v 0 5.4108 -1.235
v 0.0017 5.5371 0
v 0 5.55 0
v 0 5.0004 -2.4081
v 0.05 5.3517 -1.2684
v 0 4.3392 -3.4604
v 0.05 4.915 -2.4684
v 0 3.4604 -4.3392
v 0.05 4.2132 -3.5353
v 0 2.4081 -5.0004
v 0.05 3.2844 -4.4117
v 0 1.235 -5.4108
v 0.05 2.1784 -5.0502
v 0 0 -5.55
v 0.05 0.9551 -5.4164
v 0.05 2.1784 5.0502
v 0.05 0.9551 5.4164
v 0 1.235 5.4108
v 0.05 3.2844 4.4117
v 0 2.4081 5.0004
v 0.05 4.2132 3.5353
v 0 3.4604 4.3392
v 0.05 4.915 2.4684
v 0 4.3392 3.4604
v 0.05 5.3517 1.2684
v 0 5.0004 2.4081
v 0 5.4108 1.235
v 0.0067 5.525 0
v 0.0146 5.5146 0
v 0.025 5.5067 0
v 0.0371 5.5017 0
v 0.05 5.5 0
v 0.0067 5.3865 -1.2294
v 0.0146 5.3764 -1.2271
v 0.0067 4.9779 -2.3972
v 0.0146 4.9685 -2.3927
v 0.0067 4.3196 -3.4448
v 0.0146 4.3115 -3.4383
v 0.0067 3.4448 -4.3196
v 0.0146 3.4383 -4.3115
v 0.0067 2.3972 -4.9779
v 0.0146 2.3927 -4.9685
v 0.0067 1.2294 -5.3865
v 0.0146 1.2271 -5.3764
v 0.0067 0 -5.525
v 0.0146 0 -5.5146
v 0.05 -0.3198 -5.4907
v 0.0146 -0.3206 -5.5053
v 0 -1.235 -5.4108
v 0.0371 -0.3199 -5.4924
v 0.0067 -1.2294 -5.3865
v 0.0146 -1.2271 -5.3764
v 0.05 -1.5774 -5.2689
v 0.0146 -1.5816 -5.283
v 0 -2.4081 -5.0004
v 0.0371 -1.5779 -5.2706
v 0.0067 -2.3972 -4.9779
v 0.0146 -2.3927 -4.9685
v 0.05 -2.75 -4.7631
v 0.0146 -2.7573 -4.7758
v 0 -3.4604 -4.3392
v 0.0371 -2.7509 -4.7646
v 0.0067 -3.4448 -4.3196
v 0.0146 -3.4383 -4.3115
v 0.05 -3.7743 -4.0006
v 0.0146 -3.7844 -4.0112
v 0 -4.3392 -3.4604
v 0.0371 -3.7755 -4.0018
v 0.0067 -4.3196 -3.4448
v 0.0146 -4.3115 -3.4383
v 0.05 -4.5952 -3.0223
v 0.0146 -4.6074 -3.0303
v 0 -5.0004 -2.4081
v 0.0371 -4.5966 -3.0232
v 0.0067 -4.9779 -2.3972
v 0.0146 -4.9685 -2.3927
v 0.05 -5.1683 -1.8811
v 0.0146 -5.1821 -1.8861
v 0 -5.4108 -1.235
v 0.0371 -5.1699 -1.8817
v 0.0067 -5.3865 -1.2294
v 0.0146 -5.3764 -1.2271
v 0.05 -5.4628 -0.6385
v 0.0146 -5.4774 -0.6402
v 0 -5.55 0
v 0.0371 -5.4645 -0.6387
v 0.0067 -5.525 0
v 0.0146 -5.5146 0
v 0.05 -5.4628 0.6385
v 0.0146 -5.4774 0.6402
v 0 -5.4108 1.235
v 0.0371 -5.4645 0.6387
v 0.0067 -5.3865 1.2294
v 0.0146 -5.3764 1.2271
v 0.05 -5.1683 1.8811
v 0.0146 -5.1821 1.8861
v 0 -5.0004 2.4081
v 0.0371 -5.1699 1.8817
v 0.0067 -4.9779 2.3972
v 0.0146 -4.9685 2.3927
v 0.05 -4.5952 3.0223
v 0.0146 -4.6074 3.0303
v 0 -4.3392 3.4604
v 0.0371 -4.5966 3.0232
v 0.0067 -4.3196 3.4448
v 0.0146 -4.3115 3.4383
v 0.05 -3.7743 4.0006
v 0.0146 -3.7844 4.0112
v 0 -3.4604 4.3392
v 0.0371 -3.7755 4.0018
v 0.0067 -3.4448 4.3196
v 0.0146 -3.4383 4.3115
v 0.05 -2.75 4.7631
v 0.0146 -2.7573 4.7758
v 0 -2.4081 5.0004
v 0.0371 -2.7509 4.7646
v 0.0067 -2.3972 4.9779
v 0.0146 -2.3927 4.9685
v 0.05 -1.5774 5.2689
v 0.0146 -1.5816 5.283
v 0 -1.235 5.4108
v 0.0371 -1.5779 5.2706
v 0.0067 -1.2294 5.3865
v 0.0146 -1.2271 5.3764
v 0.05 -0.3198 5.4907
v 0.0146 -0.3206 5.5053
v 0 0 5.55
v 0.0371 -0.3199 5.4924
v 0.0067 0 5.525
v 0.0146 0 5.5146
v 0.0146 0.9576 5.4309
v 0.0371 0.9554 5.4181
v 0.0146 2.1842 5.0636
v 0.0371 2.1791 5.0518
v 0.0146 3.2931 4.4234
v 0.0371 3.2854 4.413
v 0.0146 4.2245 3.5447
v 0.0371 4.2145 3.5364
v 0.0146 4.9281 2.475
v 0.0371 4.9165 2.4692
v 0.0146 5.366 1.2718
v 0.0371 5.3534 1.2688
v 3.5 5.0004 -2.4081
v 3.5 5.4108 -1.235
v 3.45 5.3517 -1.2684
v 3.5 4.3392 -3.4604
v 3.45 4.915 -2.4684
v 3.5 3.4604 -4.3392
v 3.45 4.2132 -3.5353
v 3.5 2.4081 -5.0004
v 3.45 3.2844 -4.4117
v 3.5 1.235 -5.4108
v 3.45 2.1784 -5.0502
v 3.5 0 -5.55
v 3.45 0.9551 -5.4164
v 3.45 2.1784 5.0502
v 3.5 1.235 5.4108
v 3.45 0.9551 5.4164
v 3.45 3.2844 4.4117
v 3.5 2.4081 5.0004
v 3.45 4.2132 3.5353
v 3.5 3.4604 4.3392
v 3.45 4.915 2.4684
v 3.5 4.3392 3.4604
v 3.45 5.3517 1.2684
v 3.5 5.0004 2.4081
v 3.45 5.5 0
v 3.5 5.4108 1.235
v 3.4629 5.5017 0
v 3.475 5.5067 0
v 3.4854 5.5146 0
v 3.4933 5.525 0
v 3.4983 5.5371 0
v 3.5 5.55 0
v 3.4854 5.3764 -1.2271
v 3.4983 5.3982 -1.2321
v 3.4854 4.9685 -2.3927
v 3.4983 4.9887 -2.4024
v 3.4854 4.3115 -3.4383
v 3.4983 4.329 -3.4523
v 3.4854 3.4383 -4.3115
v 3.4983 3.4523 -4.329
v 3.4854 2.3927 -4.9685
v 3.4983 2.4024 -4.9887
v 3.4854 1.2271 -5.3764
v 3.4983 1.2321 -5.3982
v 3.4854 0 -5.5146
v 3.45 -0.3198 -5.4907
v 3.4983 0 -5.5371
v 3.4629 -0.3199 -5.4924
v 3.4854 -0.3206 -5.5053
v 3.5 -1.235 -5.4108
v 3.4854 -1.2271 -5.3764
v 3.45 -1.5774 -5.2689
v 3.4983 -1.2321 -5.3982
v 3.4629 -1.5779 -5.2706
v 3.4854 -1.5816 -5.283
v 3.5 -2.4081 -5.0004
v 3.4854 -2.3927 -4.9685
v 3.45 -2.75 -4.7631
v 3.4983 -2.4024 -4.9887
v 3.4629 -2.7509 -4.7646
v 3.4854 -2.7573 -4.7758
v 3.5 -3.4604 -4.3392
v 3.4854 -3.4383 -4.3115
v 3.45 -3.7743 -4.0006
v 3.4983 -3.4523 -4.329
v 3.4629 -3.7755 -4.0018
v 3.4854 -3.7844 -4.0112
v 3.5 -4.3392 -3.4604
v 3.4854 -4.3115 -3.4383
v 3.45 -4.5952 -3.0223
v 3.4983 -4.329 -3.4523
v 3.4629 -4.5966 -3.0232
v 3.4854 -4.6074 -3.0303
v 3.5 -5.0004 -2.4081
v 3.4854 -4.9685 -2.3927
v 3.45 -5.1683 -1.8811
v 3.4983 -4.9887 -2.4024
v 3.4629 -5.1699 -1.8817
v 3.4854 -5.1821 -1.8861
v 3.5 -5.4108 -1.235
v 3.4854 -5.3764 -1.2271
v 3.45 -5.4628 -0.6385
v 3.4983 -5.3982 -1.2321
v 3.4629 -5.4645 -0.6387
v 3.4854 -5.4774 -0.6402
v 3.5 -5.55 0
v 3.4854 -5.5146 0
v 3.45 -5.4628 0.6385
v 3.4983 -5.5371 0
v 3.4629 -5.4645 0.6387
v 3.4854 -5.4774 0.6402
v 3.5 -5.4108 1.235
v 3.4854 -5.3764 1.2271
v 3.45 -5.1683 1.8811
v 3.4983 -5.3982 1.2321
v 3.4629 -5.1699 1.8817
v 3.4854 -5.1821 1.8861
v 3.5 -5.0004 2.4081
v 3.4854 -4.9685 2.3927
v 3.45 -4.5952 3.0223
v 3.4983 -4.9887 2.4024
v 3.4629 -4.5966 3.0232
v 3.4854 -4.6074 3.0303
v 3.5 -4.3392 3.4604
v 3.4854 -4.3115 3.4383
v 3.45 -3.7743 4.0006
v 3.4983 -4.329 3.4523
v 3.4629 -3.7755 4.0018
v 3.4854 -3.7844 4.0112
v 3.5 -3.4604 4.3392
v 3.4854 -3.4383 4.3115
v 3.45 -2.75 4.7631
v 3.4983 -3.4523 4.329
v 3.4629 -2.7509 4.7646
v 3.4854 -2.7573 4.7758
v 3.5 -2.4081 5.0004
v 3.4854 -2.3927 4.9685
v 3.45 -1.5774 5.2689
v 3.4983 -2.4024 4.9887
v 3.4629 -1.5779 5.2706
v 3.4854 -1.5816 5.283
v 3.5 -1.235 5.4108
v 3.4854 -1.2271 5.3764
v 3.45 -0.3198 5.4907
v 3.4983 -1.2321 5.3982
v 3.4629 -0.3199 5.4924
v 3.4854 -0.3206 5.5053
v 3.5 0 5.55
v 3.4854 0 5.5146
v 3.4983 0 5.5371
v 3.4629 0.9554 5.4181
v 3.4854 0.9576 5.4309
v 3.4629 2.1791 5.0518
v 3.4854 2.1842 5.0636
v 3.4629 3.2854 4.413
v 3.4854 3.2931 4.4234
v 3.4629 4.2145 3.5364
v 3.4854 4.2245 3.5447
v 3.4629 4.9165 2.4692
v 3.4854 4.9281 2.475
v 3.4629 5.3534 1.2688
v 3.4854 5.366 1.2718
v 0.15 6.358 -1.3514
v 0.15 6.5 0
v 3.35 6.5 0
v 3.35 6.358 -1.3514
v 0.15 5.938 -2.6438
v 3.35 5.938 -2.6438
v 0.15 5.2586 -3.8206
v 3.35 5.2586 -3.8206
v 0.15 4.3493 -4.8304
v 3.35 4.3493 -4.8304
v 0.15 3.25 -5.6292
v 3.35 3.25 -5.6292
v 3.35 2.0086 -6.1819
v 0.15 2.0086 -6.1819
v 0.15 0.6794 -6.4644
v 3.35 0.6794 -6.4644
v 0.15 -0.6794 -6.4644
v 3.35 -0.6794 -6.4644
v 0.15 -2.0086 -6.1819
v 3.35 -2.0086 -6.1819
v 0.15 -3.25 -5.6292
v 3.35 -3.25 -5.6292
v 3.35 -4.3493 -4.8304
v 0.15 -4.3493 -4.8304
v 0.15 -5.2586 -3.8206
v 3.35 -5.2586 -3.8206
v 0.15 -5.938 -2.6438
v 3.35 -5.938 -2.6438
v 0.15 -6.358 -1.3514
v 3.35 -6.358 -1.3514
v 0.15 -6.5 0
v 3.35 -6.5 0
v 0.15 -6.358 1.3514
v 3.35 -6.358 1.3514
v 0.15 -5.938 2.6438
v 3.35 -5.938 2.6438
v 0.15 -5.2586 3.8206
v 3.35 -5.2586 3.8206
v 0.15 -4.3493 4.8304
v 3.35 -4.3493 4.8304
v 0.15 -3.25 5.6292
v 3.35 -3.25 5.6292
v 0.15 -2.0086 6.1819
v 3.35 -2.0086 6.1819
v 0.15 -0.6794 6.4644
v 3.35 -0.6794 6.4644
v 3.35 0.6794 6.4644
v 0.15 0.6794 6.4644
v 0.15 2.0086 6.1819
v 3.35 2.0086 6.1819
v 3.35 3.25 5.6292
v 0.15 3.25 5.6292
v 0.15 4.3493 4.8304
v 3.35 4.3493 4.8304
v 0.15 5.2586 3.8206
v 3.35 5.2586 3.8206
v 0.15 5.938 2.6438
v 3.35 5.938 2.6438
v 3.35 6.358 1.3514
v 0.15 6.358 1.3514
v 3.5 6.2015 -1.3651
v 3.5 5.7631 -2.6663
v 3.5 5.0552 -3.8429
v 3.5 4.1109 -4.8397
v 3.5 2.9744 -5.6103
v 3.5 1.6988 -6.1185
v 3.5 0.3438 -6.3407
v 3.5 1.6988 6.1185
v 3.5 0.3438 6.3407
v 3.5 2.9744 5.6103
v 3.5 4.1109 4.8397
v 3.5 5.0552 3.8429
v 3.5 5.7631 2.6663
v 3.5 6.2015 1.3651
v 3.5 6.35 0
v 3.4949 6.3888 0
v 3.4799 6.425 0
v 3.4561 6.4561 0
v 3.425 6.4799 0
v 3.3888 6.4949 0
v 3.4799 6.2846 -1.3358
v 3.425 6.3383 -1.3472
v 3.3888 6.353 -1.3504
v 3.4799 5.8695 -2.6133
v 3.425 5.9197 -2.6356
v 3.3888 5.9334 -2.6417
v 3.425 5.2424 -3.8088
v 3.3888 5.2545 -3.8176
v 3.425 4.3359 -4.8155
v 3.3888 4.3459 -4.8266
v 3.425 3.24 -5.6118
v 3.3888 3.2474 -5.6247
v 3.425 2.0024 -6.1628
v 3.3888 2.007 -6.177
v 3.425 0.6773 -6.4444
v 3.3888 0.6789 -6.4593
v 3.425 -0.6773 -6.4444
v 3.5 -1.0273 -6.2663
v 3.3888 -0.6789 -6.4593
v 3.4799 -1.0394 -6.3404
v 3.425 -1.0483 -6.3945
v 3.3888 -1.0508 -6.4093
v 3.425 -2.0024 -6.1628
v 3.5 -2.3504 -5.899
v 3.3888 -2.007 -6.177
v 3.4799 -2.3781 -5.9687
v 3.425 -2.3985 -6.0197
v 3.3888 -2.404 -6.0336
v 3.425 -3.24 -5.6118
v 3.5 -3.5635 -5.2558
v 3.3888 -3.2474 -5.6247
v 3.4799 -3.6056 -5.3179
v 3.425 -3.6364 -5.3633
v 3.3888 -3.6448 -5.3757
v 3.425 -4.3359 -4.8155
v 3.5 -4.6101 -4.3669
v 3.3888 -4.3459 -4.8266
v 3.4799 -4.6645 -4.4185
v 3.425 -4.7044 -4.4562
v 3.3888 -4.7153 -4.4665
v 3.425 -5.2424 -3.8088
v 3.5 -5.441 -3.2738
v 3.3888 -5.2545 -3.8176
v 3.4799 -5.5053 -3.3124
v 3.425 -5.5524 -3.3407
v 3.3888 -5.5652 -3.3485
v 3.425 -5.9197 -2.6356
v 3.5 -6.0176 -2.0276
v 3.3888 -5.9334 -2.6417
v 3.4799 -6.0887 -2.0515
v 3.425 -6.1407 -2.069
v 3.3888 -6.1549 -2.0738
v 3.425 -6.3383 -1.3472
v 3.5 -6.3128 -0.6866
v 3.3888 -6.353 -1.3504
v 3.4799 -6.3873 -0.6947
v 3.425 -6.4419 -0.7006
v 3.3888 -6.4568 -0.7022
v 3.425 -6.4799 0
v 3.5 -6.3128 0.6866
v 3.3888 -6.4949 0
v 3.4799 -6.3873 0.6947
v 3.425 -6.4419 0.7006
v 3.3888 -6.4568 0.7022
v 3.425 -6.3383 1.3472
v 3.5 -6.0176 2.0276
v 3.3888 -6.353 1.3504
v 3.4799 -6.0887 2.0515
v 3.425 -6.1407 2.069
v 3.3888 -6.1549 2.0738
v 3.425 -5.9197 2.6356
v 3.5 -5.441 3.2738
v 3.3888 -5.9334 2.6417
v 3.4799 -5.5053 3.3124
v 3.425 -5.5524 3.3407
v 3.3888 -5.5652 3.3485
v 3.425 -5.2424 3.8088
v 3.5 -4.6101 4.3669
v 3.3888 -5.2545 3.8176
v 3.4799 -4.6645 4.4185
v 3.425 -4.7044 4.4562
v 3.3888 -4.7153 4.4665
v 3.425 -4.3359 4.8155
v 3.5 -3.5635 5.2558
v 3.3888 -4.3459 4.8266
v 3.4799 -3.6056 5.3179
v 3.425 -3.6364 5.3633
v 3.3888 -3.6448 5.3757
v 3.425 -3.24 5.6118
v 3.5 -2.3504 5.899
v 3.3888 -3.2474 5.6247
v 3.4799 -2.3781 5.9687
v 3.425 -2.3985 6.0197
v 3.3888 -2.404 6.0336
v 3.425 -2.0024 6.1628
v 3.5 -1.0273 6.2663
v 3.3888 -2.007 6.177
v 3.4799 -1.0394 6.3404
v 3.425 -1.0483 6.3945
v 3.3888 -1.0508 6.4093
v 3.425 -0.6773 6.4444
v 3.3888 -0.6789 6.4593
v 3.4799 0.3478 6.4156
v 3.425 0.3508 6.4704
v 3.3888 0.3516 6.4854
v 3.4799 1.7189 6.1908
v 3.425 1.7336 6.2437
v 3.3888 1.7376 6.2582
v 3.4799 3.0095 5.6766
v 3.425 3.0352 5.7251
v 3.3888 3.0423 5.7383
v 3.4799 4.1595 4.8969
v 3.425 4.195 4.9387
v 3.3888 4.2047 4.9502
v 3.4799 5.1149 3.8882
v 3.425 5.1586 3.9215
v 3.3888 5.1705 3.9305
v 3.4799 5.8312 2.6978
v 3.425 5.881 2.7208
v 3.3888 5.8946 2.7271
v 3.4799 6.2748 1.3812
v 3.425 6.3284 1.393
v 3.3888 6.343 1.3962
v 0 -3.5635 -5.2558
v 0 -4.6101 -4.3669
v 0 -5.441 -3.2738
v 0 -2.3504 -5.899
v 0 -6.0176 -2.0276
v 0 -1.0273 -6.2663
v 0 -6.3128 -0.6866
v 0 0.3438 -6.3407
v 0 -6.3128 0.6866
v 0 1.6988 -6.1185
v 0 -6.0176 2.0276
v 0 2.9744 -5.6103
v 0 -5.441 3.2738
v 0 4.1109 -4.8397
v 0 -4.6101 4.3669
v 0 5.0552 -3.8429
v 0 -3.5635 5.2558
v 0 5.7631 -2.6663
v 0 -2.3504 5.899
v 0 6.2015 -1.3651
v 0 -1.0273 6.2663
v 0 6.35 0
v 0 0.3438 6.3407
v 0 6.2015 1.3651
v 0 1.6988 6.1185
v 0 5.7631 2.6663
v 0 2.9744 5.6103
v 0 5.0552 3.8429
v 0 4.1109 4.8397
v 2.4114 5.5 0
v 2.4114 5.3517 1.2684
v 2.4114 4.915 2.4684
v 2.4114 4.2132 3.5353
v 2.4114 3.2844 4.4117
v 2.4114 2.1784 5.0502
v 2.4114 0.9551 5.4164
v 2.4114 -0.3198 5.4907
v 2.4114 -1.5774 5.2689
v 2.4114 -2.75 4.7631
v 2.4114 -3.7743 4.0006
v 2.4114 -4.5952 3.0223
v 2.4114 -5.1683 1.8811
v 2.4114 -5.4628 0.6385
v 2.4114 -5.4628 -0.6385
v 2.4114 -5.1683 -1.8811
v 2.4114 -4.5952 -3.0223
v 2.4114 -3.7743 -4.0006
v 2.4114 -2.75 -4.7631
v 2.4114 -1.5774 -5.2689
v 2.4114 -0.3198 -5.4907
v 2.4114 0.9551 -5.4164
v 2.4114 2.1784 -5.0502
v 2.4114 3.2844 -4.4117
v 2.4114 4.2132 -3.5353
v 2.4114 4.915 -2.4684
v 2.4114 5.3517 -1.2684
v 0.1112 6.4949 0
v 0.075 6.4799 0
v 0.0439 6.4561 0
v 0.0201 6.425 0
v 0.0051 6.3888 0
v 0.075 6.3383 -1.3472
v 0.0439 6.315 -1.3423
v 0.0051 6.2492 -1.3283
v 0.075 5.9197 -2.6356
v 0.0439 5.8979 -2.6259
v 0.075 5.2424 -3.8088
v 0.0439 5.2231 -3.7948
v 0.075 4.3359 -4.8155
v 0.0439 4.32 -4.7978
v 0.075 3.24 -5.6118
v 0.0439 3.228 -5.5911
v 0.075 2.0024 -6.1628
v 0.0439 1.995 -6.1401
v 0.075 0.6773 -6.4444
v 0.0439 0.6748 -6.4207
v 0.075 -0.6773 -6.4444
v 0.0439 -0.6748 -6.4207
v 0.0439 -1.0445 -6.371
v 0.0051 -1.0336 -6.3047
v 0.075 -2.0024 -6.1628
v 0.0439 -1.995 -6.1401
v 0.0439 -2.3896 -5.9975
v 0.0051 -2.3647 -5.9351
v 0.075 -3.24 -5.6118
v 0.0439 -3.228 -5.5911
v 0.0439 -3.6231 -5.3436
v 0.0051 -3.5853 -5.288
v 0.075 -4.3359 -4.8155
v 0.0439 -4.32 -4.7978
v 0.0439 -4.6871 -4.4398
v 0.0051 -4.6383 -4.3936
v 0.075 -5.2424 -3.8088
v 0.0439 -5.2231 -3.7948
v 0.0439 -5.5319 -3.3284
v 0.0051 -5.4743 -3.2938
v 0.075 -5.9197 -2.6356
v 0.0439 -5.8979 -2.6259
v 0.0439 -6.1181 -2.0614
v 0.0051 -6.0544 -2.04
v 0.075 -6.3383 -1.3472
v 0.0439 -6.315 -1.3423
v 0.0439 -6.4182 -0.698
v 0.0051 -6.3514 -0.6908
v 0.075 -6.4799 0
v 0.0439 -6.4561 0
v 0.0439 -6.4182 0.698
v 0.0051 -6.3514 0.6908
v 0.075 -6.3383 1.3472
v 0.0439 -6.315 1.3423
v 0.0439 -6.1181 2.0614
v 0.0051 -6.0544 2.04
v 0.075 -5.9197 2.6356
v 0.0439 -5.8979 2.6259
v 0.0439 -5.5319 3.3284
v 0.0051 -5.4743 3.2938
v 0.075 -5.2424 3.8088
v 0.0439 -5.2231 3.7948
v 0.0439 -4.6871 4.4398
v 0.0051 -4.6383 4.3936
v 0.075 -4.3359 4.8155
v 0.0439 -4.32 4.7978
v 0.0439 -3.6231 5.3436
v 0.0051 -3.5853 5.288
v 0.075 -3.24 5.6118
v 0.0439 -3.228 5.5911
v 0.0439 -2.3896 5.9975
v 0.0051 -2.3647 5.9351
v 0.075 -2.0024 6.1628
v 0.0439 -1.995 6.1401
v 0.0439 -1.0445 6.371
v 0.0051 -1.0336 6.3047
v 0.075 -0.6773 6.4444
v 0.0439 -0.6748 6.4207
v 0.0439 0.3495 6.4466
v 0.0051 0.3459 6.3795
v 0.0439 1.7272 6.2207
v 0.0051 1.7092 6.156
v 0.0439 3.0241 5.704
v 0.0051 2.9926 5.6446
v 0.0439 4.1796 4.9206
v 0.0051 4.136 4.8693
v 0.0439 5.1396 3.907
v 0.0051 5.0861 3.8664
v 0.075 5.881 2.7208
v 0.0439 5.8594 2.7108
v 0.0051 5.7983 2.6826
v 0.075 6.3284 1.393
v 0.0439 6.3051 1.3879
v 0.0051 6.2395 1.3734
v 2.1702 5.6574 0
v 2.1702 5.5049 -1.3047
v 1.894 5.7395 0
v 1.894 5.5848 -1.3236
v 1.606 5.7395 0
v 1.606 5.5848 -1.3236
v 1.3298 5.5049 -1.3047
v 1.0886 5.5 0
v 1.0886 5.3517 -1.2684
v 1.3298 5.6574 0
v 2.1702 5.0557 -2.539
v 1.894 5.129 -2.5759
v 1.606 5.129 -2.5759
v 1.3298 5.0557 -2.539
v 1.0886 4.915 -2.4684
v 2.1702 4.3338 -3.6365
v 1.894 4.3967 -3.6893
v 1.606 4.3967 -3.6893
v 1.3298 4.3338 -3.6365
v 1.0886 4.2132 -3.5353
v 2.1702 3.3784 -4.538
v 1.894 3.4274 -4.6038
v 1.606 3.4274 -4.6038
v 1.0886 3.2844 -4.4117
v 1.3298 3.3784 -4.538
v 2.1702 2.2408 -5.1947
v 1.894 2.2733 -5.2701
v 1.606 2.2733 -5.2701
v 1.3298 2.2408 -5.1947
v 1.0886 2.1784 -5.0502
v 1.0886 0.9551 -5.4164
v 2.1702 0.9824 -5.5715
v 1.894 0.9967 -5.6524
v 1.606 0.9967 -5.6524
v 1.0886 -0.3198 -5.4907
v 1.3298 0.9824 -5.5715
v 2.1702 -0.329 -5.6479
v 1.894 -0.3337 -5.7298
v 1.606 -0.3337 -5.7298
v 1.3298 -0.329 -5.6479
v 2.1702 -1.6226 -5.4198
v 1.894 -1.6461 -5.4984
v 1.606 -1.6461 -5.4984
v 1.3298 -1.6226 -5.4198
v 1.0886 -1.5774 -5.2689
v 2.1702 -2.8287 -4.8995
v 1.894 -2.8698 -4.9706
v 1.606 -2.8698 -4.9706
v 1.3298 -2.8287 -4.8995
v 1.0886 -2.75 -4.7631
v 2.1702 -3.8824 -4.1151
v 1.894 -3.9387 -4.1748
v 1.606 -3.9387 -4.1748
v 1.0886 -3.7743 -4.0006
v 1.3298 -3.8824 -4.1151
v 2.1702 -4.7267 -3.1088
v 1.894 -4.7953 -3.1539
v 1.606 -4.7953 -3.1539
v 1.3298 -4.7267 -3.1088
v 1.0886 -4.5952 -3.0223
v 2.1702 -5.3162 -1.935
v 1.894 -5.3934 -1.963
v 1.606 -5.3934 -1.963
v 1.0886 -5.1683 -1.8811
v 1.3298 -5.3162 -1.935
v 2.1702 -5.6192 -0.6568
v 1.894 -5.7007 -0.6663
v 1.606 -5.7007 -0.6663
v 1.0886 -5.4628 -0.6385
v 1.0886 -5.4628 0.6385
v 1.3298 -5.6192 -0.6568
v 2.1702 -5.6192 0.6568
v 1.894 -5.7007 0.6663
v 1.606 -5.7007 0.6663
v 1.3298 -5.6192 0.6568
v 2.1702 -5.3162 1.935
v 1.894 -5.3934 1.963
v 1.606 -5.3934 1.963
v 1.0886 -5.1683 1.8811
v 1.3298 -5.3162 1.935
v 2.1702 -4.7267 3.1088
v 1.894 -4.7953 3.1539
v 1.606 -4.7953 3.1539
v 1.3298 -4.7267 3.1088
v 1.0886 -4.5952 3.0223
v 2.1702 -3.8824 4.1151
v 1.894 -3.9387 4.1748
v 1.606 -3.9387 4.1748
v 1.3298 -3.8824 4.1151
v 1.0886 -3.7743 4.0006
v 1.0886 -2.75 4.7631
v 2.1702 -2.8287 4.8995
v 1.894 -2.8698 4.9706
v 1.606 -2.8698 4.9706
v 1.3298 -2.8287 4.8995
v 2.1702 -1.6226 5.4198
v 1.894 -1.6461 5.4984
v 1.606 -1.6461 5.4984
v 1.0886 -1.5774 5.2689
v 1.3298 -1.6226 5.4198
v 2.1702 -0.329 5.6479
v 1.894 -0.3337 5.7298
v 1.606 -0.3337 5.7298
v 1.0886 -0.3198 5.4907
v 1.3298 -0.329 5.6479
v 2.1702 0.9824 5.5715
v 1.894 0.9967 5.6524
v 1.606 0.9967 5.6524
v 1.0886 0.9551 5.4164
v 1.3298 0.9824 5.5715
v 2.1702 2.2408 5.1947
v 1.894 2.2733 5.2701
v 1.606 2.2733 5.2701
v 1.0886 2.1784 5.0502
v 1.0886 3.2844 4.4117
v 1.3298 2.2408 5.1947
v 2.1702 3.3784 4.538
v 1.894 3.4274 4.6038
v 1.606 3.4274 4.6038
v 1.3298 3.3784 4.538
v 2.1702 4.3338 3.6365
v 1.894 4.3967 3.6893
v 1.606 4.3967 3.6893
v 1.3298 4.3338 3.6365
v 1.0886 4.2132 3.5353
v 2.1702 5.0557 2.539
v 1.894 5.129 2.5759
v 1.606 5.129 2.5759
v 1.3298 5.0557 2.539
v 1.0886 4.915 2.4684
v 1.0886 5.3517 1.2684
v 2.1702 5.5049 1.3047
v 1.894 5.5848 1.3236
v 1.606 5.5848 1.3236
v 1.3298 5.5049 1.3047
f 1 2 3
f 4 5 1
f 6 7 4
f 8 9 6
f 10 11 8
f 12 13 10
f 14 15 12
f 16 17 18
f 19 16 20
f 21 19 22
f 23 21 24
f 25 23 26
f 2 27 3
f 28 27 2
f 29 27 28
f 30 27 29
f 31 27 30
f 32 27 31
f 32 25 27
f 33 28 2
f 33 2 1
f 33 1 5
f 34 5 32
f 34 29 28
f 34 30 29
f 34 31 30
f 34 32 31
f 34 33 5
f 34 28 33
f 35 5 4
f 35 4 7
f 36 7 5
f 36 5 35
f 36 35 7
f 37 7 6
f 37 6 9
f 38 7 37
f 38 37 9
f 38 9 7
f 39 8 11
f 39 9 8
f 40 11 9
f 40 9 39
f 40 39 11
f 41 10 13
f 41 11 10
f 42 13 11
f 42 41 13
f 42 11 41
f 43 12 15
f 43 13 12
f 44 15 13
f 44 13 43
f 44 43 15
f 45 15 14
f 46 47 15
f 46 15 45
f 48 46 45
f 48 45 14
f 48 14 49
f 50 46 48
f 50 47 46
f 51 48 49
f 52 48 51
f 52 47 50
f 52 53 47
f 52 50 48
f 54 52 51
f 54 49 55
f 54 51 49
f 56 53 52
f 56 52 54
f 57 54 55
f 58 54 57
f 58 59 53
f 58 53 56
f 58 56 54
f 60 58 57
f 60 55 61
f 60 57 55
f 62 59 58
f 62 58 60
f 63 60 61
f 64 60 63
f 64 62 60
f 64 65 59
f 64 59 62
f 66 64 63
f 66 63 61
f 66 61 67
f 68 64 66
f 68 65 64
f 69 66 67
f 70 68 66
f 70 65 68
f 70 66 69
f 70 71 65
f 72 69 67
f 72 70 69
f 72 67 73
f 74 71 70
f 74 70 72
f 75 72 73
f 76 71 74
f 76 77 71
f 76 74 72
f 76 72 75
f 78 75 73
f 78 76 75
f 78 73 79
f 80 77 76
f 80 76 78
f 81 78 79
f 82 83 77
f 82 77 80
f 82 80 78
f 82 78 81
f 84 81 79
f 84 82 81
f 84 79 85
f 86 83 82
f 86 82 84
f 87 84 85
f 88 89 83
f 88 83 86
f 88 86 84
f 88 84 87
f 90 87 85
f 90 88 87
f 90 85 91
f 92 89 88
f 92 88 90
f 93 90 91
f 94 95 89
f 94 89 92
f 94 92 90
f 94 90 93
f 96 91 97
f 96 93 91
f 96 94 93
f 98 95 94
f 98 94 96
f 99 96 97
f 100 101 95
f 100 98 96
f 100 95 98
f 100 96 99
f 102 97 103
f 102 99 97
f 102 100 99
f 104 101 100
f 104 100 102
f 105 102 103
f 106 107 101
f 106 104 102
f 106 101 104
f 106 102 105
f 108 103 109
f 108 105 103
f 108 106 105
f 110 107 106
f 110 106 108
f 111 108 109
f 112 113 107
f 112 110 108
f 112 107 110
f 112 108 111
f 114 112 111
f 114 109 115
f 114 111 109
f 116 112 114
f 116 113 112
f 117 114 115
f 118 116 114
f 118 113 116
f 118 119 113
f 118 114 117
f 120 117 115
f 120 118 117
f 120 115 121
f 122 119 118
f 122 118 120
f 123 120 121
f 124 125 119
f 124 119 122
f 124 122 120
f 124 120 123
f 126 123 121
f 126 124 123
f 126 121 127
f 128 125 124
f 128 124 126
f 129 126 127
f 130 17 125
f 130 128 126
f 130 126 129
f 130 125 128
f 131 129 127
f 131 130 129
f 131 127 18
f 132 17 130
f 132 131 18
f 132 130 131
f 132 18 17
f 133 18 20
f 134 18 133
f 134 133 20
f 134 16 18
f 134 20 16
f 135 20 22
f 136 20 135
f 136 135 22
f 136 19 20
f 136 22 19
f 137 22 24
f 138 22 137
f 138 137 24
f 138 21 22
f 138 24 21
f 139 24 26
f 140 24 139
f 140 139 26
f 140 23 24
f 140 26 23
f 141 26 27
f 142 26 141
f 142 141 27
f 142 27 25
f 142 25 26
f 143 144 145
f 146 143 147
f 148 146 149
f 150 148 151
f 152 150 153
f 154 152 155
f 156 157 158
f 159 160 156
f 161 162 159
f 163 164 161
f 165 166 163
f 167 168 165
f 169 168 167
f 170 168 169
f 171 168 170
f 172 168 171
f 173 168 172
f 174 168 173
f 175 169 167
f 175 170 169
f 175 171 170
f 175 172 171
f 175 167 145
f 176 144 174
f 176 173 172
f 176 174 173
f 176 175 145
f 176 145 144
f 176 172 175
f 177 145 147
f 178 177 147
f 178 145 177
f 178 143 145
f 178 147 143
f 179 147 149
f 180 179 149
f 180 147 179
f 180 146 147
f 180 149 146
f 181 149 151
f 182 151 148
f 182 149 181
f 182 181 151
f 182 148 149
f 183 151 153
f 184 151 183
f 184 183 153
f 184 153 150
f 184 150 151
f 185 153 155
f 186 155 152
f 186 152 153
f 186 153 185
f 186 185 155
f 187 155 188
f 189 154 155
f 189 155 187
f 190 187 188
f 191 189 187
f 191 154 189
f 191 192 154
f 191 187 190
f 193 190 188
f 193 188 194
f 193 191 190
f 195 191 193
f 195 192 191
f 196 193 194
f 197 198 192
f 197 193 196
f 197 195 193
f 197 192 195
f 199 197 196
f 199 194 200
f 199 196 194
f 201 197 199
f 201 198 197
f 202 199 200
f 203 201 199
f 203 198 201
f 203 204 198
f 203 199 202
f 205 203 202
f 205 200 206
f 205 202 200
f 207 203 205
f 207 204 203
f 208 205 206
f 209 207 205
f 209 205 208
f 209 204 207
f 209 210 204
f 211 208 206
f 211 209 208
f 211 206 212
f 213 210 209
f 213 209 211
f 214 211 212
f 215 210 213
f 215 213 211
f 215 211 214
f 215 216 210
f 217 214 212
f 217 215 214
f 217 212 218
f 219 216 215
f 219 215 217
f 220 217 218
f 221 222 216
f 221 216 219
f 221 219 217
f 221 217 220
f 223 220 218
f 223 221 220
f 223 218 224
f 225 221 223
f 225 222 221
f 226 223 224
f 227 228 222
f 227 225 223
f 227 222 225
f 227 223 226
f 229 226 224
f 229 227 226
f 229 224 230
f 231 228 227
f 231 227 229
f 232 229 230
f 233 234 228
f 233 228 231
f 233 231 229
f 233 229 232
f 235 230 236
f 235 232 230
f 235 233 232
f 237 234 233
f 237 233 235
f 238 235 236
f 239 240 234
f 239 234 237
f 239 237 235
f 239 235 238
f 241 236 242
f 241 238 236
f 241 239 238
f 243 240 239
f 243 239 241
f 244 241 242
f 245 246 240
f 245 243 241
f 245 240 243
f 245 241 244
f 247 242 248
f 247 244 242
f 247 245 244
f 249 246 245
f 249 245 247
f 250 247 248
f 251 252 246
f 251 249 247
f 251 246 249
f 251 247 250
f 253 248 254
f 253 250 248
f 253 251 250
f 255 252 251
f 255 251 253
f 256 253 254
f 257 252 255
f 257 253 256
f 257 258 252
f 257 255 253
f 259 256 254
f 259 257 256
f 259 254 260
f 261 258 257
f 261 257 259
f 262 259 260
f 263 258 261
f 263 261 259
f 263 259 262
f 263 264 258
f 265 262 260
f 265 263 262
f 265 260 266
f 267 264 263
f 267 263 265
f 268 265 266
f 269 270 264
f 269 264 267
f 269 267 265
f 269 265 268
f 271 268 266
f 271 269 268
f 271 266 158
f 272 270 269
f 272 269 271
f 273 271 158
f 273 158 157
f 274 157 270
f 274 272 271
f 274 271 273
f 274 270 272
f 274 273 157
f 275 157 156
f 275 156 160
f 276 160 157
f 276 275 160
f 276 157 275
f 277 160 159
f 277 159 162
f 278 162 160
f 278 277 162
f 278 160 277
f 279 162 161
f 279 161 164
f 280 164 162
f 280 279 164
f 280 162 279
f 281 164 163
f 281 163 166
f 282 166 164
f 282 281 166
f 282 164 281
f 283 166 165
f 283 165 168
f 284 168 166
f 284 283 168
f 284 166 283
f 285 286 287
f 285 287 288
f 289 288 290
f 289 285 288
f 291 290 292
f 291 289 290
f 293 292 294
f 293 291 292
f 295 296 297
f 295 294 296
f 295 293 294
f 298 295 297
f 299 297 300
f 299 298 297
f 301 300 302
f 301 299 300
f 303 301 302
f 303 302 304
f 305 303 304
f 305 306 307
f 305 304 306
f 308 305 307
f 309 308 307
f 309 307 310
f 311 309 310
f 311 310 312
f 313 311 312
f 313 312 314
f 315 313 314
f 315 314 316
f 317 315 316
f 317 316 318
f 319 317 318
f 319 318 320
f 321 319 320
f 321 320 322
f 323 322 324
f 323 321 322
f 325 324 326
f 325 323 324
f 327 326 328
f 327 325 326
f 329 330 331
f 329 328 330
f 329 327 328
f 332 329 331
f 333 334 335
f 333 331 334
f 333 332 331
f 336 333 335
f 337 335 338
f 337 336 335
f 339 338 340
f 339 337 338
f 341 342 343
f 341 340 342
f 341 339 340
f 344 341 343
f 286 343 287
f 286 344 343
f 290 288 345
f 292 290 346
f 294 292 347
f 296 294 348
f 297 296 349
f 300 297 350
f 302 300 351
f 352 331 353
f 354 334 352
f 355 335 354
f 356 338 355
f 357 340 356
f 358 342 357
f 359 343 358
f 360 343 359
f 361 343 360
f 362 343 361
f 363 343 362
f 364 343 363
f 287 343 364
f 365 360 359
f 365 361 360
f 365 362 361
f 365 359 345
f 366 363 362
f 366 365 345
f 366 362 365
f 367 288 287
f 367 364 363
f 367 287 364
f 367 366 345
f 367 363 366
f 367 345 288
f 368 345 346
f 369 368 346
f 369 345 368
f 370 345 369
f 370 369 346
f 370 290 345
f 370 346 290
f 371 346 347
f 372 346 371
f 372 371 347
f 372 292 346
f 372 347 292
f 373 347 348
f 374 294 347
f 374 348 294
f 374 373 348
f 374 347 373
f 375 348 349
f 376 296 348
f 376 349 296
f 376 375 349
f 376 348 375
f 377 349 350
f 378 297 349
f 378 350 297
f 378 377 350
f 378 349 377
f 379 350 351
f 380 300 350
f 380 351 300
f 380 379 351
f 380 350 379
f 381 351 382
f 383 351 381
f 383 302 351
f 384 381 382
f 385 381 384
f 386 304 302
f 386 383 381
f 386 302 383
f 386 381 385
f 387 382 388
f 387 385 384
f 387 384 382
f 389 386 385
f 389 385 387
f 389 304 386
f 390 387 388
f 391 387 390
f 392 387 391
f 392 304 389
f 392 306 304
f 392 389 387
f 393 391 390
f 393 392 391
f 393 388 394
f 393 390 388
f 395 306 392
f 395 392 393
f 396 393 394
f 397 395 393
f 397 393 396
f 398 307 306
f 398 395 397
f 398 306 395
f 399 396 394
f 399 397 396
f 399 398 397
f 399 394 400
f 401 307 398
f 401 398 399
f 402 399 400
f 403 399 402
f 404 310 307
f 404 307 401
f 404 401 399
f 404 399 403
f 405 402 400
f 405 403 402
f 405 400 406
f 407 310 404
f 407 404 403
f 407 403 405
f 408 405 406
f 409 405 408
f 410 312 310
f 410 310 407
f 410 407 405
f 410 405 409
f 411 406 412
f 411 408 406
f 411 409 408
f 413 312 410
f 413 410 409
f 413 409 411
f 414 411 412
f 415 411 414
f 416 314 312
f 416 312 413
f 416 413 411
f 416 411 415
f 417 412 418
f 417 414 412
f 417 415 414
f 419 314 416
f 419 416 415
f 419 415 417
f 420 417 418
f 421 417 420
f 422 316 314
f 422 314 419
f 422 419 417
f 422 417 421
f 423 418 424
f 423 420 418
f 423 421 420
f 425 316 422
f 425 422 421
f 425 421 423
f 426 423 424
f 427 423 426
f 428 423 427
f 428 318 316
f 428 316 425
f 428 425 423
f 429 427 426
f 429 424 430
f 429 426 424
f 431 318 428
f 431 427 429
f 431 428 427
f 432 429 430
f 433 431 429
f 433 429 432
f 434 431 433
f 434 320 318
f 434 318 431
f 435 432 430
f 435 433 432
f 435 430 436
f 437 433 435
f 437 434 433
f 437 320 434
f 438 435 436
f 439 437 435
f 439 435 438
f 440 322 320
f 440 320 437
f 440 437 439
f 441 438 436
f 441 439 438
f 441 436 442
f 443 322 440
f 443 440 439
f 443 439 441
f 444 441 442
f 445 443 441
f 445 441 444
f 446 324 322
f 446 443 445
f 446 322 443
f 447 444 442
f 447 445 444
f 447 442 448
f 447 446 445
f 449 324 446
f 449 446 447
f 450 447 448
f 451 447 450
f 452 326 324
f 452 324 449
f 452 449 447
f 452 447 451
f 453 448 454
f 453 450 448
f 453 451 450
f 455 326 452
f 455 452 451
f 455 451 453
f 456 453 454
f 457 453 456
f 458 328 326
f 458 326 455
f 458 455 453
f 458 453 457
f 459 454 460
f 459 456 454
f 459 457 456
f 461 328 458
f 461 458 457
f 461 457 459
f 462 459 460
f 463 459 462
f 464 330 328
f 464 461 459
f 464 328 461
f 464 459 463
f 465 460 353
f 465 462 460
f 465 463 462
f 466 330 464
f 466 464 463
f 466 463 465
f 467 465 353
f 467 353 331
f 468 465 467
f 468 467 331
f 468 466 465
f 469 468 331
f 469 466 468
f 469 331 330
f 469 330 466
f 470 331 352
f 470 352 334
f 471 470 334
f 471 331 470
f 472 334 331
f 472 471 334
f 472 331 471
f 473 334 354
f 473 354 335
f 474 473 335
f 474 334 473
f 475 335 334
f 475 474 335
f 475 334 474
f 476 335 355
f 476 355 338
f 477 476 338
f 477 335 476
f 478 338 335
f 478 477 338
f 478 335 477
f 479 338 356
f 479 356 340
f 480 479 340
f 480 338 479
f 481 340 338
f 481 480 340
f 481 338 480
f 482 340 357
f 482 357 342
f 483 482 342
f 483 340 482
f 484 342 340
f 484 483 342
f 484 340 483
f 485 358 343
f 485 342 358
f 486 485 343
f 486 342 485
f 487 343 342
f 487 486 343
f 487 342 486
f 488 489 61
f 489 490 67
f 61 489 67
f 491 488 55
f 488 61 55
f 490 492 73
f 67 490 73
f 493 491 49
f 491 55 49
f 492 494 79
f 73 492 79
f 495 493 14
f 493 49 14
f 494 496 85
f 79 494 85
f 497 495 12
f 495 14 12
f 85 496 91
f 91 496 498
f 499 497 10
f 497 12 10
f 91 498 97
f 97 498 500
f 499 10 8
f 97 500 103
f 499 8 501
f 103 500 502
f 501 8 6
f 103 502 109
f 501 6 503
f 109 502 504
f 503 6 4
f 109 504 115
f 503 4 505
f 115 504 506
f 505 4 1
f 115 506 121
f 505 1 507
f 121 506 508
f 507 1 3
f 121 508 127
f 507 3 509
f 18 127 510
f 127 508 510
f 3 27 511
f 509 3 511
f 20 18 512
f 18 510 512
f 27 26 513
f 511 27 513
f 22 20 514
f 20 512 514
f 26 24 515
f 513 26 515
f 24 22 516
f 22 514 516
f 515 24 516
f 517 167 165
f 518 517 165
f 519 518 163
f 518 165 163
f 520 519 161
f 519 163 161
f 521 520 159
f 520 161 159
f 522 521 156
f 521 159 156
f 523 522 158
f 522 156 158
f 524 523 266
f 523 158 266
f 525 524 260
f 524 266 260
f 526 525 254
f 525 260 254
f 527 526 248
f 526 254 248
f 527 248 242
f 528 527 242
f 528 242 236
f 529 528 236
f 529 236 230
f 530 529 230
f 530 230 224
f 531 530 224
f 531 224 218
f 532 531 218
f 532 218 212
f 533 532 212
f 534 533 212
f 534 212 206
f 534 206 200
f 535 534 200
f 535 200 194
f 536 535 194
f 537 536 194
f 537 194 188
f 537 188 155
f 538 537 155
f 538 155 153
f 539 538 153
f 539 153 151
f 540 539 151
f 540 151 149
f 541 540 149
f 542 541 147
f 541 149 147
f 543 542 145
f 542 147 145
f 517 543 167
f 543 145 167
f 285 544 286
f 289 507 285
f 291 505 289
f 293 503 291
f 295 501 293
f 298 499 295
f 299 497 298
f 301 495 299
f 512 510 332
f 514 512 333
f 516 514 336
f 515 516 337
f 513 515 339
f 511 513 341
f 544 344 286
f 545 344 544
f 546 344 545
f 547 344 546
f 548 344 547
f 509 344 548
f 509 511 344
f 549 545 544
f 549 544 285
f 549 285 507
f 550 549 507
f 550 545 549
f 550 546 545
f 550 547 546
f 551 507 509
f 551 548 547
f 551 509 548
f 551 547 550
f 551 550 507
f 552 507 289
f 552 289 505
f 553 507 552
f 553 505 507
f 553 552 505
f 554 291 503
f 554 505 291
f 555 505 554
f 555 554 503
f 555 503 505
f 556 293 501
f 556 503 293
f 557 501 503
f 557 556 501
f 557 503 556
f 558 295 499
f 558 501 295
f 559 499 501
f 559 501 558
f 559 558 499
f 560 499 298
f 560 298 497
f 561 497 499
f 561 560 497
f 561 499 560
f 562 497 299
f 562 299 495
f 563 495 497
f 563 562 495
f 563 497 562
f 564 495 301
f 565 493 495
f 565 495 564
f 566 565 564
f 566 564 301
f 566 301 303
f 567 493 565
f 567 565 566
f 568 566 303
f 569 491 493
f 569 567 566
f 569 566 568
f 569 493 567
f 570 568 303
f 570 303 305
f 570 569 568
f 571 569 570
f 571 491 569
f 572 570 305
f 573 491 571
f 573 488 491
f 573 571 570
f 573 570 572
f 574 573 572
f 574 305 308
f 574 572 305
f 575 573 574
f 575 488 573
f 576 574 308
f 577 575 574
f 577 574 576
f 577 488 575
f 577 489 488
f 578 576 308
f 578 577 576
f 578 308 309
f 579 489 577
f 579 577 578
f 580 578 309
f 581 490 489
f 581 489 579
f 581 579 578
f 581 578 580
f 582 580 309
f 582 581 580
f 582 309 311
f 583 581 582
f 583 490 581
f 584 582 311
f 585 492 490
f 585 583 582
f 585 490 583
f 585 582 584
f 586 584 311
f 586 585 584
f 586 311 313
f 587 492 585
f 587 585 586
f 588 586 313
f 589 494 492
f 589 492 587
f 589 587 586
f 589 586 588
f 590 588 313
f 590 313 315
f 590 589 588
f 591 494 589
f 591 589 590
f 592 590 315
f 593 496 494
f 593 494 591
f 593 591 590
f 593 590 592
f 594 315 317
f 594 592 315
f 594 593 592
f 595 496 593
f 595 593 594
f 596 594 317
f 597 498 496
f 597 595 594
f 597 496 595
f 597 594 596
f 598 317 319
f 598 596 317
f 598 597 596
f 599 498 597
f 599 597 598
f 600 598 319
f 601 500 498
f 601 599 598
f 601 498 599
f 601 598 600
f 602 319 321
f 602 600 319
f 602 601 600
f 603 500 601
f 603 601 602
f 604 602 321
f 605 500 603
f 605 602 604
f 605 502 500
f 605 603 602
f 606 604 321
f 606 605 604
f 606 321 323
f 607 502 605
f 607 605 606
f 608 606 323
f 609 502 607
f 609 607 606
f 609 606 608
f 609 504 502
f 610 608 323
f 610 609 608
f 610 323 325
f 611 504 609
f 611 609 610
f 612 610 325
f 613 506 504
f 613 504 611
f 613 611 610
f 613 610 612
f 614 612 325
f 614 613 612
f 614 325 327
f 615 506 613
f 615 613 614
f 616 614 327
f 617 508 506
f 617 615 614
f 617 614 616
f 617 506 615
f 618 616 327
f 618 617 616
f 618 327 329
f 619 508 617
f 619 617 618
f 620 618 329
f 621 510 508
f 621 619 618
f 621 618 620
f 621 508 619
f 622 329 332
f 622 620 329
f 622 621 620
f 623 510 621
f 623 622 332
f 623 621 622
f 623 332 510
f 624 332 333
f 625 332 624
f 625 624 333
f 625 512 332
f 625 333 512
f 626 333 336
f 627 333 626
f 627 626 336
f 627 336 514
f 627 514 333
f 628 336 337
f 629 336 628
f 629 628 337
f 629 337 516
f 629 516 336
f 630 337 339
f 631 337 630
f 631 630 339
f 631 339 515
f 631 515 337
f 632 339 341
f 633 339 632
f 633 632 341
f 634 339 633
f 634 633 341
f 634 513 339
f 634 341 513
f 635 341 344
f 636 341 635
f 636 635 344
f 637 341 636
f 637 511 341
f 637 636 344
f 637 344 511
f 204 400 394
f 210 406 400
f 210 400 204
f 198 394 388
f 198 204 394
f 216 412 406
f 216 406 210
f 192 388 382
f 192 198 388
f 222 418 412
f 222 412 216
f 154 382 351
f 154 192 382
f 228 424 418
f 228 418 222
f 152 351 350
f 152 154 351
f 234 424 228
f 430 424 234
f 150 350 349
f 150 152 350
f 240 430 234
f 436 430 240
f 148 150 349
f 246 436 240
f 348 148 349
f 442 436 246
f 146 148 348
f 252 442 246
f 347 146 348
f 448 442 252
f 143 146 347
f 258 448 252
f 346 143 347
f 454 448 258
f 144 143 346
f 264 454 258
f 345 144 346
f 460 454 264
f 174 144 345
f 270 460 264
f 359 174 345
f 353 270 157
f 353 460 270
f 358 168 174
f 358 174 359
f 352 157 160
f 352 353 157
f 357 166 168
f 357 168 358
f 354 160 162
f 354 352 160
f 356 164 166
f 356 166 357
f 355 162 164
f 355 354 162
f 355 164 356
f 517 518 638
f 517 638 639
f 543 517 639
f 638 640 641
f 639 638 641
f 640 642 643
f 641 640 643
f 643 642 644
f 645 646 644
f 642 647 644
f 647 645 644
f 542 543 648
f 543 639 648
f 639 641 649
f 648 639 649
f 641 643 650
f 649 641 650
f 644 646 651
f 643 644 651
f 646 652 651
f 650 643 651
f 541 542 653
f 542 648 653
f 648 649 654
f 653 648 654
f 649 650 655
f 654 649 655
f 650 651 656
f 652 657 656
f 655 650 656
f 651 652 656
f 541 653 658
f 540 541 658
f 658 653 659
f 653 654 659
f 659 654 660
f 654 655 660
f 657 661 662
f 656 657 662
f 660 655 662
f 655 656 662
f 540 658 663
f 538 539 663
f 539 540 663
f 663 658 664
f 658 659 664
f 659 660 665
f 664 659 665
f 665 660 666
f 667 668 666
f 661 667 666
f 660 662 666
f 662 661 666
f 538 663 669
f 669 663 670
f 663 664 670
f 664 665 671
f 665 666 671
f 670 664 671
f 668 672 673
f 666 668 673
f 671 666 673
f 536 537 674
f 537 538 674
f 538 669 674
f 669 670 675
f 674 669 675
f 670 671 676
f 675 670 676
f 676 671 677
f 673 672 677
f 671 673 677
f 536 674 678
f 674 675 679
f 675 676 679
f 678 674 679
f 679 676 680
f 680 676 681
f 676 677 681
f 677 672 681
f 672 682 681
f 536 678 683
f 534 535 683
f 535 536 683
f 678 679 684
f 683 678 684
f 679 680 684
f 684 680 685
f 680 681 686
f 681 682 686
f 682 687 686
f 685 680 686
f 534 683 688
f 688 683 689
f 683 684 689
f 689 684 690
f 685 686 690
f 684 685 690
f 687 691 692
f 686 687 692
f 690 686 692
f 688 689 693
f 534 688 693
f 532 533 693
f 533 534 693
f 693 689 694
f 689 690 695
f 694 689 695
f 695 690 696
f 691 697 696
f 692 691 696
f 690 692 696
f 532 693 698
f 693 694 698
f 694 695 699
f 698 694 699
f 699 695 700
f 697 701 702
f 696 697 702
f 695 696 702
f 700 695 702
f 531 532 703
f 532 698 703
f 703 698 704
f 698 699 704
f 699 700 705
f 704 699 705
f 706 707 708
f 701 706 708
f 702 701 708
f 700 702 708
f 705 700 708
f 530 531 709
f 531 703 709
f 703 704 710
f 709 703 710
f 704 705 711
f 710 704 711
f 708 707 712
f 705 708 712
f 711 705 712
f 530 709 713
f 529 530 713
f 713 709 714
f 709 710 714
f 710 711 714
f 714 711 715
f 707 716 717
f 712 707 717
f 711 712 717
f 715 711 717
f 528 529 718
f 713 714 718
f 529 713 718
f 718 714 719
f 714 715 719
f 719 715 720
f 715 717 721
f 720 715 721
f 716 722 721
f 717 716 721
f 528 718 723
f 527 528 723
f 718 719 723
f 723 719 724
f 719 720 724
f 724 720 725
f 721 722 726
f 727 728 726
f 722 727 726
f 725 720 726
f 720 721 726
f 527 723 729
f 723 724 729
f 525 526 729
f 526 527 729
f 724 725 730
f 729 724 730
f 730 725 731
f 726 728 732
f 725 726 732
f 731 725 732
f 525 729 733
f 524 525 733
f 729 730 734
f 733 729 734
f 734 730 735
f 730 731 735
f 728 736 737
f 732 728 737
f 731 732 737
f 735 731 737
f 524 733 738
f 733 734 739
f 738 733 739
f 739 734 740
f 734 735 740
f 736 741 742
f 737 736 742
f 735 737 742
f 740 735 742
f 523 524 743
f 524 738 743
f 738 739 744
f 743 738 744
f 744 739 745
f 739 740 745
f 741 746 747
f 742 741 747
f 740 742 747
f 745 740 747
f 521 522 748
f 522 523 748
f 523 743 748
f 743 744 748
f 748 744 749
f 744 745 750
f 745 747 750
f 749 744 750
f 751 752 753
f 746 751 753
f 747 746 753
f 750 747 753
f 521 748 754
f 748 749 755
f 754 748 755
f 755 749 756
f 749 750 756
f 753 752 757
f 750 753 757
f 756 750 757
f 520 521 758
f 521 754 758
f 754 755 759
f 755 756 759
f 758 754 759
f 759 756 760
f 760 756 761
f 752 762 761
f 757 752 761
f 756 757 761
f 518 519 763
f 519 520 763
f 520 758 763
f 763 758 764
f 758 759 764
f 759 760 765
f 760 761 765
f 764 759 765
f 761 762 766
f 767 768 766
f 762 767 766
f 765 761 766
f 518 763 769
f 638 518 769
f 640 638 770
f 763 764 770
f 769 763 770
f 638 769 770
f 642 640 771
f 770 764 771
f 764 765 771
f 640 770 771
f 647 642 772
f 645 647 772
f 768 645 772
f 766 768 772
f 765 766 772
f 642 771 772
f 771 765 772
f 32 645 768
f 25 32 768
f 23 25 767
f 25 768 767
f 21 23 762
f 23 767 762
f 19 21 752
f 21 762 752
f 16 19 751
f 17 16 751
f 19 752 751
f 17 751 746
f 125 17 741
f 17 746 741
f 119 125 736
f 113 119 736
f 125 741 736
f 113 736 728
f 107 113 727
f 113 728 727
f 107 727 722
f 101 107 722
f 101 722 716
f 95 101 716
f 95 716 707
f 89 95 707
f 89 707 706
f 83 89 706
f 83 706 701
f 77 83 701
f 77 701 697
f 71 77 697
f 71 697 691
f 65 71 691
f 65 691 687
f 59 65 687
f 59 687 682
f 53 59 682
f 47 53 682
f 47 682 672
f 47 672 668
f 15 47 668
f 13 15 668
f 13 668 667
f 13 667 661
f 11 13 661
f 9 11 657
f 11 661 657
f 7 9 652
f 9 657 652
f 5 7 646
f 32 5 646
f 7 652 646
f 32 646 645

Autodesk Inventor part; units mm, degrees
ref_plane "YZ Plane" through (0, 0, 0) normal (1, 0, 0) x (0, 1, 0)
ref_plane "XZ Plane" through (0, 0, 0) normal (0, 1, 0) x (-1, 0, 0)
ref_plane "XY Plane" through (0, 0, 0) normal (0, 0, 1) x (1, 0, 0)
sketch "Sketch_1" plane through (0, 0, 0) normal (0, 0, 1) x (1, 0, 0)
  line L0 (50, 0) -> (-50, 0)
  line L1 (0, 6.35) -> (0, 5.55)
  arc A0 (0, 5.55) -> (0.05, 5.5) centre (0.05, 5.55) ccw
  line L2 (0.05, 5.5) -> (1.0886, 5.5)
  arc A1 (2.4114, 5.5) -> (1.0886, 5.5) centre (1.75, 4.75) ccw
  line L3 (2.4114, 5.5) -> (3.45, 5.5)
  arc A2 (3.45, 5.5) -> (3.5, 5.55) centre (3.45, 5.55) ccw
  line L4 (3.5, 5.55) -> (3.5, 6.35)
  arc A3 (3.5, 6.35) -> (3.35, 6.5) centre (3.35, 6.35) ccw
  line L5 (3.35, 6.5) -> (0.15, 6.5)
  arc A4 (0.15, 6.5) -> (0, 6.35) centre (0.15, 6.35) ccw
revolve "Revolution1" add sketch "Sketch_1" angle 360 about axis through (50, 0, 0) along (1, 0, 0)
properties part number "SKF_618/6_PART2"
